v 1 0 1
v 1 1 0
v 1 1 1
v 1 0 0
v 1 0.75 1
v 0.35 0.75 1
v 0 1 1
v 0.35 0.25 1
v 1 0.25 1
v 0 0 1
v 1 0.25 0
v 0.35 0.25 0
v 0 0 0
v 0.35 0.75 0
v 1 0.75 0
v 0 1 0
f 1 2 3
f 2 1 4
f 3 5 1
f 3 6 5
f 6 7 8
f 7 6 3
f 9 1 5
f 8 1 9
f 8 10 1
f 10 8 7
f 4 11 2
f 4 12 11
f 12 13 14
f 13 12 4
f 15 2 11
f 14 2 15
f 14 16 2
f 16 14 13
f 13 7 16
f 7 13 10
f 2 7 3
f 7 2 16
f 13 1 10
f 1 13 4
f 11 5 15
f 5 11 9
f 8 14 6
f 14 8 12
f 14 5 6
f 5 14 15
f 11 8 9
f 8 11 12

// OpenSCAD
difference() {
  translate([0.5000000000, 0.5000000000, 0.5000000000]) {
    translate([-0.5000000000, -0.5000000000, -0.5000000000]) {
      cube([1, 1, 1]);
    }
  }
  translate([0.6749995000, 0.5000000000, 0.5000000000]) {
    scale([0.6500000000, 0.5000000000, 1.0000000000]) {
      translate([-0.5000000000, -0.5000000000, -0.5000000000]) {
        cube([1, 1, 1]);
      }
    }
  }
}
